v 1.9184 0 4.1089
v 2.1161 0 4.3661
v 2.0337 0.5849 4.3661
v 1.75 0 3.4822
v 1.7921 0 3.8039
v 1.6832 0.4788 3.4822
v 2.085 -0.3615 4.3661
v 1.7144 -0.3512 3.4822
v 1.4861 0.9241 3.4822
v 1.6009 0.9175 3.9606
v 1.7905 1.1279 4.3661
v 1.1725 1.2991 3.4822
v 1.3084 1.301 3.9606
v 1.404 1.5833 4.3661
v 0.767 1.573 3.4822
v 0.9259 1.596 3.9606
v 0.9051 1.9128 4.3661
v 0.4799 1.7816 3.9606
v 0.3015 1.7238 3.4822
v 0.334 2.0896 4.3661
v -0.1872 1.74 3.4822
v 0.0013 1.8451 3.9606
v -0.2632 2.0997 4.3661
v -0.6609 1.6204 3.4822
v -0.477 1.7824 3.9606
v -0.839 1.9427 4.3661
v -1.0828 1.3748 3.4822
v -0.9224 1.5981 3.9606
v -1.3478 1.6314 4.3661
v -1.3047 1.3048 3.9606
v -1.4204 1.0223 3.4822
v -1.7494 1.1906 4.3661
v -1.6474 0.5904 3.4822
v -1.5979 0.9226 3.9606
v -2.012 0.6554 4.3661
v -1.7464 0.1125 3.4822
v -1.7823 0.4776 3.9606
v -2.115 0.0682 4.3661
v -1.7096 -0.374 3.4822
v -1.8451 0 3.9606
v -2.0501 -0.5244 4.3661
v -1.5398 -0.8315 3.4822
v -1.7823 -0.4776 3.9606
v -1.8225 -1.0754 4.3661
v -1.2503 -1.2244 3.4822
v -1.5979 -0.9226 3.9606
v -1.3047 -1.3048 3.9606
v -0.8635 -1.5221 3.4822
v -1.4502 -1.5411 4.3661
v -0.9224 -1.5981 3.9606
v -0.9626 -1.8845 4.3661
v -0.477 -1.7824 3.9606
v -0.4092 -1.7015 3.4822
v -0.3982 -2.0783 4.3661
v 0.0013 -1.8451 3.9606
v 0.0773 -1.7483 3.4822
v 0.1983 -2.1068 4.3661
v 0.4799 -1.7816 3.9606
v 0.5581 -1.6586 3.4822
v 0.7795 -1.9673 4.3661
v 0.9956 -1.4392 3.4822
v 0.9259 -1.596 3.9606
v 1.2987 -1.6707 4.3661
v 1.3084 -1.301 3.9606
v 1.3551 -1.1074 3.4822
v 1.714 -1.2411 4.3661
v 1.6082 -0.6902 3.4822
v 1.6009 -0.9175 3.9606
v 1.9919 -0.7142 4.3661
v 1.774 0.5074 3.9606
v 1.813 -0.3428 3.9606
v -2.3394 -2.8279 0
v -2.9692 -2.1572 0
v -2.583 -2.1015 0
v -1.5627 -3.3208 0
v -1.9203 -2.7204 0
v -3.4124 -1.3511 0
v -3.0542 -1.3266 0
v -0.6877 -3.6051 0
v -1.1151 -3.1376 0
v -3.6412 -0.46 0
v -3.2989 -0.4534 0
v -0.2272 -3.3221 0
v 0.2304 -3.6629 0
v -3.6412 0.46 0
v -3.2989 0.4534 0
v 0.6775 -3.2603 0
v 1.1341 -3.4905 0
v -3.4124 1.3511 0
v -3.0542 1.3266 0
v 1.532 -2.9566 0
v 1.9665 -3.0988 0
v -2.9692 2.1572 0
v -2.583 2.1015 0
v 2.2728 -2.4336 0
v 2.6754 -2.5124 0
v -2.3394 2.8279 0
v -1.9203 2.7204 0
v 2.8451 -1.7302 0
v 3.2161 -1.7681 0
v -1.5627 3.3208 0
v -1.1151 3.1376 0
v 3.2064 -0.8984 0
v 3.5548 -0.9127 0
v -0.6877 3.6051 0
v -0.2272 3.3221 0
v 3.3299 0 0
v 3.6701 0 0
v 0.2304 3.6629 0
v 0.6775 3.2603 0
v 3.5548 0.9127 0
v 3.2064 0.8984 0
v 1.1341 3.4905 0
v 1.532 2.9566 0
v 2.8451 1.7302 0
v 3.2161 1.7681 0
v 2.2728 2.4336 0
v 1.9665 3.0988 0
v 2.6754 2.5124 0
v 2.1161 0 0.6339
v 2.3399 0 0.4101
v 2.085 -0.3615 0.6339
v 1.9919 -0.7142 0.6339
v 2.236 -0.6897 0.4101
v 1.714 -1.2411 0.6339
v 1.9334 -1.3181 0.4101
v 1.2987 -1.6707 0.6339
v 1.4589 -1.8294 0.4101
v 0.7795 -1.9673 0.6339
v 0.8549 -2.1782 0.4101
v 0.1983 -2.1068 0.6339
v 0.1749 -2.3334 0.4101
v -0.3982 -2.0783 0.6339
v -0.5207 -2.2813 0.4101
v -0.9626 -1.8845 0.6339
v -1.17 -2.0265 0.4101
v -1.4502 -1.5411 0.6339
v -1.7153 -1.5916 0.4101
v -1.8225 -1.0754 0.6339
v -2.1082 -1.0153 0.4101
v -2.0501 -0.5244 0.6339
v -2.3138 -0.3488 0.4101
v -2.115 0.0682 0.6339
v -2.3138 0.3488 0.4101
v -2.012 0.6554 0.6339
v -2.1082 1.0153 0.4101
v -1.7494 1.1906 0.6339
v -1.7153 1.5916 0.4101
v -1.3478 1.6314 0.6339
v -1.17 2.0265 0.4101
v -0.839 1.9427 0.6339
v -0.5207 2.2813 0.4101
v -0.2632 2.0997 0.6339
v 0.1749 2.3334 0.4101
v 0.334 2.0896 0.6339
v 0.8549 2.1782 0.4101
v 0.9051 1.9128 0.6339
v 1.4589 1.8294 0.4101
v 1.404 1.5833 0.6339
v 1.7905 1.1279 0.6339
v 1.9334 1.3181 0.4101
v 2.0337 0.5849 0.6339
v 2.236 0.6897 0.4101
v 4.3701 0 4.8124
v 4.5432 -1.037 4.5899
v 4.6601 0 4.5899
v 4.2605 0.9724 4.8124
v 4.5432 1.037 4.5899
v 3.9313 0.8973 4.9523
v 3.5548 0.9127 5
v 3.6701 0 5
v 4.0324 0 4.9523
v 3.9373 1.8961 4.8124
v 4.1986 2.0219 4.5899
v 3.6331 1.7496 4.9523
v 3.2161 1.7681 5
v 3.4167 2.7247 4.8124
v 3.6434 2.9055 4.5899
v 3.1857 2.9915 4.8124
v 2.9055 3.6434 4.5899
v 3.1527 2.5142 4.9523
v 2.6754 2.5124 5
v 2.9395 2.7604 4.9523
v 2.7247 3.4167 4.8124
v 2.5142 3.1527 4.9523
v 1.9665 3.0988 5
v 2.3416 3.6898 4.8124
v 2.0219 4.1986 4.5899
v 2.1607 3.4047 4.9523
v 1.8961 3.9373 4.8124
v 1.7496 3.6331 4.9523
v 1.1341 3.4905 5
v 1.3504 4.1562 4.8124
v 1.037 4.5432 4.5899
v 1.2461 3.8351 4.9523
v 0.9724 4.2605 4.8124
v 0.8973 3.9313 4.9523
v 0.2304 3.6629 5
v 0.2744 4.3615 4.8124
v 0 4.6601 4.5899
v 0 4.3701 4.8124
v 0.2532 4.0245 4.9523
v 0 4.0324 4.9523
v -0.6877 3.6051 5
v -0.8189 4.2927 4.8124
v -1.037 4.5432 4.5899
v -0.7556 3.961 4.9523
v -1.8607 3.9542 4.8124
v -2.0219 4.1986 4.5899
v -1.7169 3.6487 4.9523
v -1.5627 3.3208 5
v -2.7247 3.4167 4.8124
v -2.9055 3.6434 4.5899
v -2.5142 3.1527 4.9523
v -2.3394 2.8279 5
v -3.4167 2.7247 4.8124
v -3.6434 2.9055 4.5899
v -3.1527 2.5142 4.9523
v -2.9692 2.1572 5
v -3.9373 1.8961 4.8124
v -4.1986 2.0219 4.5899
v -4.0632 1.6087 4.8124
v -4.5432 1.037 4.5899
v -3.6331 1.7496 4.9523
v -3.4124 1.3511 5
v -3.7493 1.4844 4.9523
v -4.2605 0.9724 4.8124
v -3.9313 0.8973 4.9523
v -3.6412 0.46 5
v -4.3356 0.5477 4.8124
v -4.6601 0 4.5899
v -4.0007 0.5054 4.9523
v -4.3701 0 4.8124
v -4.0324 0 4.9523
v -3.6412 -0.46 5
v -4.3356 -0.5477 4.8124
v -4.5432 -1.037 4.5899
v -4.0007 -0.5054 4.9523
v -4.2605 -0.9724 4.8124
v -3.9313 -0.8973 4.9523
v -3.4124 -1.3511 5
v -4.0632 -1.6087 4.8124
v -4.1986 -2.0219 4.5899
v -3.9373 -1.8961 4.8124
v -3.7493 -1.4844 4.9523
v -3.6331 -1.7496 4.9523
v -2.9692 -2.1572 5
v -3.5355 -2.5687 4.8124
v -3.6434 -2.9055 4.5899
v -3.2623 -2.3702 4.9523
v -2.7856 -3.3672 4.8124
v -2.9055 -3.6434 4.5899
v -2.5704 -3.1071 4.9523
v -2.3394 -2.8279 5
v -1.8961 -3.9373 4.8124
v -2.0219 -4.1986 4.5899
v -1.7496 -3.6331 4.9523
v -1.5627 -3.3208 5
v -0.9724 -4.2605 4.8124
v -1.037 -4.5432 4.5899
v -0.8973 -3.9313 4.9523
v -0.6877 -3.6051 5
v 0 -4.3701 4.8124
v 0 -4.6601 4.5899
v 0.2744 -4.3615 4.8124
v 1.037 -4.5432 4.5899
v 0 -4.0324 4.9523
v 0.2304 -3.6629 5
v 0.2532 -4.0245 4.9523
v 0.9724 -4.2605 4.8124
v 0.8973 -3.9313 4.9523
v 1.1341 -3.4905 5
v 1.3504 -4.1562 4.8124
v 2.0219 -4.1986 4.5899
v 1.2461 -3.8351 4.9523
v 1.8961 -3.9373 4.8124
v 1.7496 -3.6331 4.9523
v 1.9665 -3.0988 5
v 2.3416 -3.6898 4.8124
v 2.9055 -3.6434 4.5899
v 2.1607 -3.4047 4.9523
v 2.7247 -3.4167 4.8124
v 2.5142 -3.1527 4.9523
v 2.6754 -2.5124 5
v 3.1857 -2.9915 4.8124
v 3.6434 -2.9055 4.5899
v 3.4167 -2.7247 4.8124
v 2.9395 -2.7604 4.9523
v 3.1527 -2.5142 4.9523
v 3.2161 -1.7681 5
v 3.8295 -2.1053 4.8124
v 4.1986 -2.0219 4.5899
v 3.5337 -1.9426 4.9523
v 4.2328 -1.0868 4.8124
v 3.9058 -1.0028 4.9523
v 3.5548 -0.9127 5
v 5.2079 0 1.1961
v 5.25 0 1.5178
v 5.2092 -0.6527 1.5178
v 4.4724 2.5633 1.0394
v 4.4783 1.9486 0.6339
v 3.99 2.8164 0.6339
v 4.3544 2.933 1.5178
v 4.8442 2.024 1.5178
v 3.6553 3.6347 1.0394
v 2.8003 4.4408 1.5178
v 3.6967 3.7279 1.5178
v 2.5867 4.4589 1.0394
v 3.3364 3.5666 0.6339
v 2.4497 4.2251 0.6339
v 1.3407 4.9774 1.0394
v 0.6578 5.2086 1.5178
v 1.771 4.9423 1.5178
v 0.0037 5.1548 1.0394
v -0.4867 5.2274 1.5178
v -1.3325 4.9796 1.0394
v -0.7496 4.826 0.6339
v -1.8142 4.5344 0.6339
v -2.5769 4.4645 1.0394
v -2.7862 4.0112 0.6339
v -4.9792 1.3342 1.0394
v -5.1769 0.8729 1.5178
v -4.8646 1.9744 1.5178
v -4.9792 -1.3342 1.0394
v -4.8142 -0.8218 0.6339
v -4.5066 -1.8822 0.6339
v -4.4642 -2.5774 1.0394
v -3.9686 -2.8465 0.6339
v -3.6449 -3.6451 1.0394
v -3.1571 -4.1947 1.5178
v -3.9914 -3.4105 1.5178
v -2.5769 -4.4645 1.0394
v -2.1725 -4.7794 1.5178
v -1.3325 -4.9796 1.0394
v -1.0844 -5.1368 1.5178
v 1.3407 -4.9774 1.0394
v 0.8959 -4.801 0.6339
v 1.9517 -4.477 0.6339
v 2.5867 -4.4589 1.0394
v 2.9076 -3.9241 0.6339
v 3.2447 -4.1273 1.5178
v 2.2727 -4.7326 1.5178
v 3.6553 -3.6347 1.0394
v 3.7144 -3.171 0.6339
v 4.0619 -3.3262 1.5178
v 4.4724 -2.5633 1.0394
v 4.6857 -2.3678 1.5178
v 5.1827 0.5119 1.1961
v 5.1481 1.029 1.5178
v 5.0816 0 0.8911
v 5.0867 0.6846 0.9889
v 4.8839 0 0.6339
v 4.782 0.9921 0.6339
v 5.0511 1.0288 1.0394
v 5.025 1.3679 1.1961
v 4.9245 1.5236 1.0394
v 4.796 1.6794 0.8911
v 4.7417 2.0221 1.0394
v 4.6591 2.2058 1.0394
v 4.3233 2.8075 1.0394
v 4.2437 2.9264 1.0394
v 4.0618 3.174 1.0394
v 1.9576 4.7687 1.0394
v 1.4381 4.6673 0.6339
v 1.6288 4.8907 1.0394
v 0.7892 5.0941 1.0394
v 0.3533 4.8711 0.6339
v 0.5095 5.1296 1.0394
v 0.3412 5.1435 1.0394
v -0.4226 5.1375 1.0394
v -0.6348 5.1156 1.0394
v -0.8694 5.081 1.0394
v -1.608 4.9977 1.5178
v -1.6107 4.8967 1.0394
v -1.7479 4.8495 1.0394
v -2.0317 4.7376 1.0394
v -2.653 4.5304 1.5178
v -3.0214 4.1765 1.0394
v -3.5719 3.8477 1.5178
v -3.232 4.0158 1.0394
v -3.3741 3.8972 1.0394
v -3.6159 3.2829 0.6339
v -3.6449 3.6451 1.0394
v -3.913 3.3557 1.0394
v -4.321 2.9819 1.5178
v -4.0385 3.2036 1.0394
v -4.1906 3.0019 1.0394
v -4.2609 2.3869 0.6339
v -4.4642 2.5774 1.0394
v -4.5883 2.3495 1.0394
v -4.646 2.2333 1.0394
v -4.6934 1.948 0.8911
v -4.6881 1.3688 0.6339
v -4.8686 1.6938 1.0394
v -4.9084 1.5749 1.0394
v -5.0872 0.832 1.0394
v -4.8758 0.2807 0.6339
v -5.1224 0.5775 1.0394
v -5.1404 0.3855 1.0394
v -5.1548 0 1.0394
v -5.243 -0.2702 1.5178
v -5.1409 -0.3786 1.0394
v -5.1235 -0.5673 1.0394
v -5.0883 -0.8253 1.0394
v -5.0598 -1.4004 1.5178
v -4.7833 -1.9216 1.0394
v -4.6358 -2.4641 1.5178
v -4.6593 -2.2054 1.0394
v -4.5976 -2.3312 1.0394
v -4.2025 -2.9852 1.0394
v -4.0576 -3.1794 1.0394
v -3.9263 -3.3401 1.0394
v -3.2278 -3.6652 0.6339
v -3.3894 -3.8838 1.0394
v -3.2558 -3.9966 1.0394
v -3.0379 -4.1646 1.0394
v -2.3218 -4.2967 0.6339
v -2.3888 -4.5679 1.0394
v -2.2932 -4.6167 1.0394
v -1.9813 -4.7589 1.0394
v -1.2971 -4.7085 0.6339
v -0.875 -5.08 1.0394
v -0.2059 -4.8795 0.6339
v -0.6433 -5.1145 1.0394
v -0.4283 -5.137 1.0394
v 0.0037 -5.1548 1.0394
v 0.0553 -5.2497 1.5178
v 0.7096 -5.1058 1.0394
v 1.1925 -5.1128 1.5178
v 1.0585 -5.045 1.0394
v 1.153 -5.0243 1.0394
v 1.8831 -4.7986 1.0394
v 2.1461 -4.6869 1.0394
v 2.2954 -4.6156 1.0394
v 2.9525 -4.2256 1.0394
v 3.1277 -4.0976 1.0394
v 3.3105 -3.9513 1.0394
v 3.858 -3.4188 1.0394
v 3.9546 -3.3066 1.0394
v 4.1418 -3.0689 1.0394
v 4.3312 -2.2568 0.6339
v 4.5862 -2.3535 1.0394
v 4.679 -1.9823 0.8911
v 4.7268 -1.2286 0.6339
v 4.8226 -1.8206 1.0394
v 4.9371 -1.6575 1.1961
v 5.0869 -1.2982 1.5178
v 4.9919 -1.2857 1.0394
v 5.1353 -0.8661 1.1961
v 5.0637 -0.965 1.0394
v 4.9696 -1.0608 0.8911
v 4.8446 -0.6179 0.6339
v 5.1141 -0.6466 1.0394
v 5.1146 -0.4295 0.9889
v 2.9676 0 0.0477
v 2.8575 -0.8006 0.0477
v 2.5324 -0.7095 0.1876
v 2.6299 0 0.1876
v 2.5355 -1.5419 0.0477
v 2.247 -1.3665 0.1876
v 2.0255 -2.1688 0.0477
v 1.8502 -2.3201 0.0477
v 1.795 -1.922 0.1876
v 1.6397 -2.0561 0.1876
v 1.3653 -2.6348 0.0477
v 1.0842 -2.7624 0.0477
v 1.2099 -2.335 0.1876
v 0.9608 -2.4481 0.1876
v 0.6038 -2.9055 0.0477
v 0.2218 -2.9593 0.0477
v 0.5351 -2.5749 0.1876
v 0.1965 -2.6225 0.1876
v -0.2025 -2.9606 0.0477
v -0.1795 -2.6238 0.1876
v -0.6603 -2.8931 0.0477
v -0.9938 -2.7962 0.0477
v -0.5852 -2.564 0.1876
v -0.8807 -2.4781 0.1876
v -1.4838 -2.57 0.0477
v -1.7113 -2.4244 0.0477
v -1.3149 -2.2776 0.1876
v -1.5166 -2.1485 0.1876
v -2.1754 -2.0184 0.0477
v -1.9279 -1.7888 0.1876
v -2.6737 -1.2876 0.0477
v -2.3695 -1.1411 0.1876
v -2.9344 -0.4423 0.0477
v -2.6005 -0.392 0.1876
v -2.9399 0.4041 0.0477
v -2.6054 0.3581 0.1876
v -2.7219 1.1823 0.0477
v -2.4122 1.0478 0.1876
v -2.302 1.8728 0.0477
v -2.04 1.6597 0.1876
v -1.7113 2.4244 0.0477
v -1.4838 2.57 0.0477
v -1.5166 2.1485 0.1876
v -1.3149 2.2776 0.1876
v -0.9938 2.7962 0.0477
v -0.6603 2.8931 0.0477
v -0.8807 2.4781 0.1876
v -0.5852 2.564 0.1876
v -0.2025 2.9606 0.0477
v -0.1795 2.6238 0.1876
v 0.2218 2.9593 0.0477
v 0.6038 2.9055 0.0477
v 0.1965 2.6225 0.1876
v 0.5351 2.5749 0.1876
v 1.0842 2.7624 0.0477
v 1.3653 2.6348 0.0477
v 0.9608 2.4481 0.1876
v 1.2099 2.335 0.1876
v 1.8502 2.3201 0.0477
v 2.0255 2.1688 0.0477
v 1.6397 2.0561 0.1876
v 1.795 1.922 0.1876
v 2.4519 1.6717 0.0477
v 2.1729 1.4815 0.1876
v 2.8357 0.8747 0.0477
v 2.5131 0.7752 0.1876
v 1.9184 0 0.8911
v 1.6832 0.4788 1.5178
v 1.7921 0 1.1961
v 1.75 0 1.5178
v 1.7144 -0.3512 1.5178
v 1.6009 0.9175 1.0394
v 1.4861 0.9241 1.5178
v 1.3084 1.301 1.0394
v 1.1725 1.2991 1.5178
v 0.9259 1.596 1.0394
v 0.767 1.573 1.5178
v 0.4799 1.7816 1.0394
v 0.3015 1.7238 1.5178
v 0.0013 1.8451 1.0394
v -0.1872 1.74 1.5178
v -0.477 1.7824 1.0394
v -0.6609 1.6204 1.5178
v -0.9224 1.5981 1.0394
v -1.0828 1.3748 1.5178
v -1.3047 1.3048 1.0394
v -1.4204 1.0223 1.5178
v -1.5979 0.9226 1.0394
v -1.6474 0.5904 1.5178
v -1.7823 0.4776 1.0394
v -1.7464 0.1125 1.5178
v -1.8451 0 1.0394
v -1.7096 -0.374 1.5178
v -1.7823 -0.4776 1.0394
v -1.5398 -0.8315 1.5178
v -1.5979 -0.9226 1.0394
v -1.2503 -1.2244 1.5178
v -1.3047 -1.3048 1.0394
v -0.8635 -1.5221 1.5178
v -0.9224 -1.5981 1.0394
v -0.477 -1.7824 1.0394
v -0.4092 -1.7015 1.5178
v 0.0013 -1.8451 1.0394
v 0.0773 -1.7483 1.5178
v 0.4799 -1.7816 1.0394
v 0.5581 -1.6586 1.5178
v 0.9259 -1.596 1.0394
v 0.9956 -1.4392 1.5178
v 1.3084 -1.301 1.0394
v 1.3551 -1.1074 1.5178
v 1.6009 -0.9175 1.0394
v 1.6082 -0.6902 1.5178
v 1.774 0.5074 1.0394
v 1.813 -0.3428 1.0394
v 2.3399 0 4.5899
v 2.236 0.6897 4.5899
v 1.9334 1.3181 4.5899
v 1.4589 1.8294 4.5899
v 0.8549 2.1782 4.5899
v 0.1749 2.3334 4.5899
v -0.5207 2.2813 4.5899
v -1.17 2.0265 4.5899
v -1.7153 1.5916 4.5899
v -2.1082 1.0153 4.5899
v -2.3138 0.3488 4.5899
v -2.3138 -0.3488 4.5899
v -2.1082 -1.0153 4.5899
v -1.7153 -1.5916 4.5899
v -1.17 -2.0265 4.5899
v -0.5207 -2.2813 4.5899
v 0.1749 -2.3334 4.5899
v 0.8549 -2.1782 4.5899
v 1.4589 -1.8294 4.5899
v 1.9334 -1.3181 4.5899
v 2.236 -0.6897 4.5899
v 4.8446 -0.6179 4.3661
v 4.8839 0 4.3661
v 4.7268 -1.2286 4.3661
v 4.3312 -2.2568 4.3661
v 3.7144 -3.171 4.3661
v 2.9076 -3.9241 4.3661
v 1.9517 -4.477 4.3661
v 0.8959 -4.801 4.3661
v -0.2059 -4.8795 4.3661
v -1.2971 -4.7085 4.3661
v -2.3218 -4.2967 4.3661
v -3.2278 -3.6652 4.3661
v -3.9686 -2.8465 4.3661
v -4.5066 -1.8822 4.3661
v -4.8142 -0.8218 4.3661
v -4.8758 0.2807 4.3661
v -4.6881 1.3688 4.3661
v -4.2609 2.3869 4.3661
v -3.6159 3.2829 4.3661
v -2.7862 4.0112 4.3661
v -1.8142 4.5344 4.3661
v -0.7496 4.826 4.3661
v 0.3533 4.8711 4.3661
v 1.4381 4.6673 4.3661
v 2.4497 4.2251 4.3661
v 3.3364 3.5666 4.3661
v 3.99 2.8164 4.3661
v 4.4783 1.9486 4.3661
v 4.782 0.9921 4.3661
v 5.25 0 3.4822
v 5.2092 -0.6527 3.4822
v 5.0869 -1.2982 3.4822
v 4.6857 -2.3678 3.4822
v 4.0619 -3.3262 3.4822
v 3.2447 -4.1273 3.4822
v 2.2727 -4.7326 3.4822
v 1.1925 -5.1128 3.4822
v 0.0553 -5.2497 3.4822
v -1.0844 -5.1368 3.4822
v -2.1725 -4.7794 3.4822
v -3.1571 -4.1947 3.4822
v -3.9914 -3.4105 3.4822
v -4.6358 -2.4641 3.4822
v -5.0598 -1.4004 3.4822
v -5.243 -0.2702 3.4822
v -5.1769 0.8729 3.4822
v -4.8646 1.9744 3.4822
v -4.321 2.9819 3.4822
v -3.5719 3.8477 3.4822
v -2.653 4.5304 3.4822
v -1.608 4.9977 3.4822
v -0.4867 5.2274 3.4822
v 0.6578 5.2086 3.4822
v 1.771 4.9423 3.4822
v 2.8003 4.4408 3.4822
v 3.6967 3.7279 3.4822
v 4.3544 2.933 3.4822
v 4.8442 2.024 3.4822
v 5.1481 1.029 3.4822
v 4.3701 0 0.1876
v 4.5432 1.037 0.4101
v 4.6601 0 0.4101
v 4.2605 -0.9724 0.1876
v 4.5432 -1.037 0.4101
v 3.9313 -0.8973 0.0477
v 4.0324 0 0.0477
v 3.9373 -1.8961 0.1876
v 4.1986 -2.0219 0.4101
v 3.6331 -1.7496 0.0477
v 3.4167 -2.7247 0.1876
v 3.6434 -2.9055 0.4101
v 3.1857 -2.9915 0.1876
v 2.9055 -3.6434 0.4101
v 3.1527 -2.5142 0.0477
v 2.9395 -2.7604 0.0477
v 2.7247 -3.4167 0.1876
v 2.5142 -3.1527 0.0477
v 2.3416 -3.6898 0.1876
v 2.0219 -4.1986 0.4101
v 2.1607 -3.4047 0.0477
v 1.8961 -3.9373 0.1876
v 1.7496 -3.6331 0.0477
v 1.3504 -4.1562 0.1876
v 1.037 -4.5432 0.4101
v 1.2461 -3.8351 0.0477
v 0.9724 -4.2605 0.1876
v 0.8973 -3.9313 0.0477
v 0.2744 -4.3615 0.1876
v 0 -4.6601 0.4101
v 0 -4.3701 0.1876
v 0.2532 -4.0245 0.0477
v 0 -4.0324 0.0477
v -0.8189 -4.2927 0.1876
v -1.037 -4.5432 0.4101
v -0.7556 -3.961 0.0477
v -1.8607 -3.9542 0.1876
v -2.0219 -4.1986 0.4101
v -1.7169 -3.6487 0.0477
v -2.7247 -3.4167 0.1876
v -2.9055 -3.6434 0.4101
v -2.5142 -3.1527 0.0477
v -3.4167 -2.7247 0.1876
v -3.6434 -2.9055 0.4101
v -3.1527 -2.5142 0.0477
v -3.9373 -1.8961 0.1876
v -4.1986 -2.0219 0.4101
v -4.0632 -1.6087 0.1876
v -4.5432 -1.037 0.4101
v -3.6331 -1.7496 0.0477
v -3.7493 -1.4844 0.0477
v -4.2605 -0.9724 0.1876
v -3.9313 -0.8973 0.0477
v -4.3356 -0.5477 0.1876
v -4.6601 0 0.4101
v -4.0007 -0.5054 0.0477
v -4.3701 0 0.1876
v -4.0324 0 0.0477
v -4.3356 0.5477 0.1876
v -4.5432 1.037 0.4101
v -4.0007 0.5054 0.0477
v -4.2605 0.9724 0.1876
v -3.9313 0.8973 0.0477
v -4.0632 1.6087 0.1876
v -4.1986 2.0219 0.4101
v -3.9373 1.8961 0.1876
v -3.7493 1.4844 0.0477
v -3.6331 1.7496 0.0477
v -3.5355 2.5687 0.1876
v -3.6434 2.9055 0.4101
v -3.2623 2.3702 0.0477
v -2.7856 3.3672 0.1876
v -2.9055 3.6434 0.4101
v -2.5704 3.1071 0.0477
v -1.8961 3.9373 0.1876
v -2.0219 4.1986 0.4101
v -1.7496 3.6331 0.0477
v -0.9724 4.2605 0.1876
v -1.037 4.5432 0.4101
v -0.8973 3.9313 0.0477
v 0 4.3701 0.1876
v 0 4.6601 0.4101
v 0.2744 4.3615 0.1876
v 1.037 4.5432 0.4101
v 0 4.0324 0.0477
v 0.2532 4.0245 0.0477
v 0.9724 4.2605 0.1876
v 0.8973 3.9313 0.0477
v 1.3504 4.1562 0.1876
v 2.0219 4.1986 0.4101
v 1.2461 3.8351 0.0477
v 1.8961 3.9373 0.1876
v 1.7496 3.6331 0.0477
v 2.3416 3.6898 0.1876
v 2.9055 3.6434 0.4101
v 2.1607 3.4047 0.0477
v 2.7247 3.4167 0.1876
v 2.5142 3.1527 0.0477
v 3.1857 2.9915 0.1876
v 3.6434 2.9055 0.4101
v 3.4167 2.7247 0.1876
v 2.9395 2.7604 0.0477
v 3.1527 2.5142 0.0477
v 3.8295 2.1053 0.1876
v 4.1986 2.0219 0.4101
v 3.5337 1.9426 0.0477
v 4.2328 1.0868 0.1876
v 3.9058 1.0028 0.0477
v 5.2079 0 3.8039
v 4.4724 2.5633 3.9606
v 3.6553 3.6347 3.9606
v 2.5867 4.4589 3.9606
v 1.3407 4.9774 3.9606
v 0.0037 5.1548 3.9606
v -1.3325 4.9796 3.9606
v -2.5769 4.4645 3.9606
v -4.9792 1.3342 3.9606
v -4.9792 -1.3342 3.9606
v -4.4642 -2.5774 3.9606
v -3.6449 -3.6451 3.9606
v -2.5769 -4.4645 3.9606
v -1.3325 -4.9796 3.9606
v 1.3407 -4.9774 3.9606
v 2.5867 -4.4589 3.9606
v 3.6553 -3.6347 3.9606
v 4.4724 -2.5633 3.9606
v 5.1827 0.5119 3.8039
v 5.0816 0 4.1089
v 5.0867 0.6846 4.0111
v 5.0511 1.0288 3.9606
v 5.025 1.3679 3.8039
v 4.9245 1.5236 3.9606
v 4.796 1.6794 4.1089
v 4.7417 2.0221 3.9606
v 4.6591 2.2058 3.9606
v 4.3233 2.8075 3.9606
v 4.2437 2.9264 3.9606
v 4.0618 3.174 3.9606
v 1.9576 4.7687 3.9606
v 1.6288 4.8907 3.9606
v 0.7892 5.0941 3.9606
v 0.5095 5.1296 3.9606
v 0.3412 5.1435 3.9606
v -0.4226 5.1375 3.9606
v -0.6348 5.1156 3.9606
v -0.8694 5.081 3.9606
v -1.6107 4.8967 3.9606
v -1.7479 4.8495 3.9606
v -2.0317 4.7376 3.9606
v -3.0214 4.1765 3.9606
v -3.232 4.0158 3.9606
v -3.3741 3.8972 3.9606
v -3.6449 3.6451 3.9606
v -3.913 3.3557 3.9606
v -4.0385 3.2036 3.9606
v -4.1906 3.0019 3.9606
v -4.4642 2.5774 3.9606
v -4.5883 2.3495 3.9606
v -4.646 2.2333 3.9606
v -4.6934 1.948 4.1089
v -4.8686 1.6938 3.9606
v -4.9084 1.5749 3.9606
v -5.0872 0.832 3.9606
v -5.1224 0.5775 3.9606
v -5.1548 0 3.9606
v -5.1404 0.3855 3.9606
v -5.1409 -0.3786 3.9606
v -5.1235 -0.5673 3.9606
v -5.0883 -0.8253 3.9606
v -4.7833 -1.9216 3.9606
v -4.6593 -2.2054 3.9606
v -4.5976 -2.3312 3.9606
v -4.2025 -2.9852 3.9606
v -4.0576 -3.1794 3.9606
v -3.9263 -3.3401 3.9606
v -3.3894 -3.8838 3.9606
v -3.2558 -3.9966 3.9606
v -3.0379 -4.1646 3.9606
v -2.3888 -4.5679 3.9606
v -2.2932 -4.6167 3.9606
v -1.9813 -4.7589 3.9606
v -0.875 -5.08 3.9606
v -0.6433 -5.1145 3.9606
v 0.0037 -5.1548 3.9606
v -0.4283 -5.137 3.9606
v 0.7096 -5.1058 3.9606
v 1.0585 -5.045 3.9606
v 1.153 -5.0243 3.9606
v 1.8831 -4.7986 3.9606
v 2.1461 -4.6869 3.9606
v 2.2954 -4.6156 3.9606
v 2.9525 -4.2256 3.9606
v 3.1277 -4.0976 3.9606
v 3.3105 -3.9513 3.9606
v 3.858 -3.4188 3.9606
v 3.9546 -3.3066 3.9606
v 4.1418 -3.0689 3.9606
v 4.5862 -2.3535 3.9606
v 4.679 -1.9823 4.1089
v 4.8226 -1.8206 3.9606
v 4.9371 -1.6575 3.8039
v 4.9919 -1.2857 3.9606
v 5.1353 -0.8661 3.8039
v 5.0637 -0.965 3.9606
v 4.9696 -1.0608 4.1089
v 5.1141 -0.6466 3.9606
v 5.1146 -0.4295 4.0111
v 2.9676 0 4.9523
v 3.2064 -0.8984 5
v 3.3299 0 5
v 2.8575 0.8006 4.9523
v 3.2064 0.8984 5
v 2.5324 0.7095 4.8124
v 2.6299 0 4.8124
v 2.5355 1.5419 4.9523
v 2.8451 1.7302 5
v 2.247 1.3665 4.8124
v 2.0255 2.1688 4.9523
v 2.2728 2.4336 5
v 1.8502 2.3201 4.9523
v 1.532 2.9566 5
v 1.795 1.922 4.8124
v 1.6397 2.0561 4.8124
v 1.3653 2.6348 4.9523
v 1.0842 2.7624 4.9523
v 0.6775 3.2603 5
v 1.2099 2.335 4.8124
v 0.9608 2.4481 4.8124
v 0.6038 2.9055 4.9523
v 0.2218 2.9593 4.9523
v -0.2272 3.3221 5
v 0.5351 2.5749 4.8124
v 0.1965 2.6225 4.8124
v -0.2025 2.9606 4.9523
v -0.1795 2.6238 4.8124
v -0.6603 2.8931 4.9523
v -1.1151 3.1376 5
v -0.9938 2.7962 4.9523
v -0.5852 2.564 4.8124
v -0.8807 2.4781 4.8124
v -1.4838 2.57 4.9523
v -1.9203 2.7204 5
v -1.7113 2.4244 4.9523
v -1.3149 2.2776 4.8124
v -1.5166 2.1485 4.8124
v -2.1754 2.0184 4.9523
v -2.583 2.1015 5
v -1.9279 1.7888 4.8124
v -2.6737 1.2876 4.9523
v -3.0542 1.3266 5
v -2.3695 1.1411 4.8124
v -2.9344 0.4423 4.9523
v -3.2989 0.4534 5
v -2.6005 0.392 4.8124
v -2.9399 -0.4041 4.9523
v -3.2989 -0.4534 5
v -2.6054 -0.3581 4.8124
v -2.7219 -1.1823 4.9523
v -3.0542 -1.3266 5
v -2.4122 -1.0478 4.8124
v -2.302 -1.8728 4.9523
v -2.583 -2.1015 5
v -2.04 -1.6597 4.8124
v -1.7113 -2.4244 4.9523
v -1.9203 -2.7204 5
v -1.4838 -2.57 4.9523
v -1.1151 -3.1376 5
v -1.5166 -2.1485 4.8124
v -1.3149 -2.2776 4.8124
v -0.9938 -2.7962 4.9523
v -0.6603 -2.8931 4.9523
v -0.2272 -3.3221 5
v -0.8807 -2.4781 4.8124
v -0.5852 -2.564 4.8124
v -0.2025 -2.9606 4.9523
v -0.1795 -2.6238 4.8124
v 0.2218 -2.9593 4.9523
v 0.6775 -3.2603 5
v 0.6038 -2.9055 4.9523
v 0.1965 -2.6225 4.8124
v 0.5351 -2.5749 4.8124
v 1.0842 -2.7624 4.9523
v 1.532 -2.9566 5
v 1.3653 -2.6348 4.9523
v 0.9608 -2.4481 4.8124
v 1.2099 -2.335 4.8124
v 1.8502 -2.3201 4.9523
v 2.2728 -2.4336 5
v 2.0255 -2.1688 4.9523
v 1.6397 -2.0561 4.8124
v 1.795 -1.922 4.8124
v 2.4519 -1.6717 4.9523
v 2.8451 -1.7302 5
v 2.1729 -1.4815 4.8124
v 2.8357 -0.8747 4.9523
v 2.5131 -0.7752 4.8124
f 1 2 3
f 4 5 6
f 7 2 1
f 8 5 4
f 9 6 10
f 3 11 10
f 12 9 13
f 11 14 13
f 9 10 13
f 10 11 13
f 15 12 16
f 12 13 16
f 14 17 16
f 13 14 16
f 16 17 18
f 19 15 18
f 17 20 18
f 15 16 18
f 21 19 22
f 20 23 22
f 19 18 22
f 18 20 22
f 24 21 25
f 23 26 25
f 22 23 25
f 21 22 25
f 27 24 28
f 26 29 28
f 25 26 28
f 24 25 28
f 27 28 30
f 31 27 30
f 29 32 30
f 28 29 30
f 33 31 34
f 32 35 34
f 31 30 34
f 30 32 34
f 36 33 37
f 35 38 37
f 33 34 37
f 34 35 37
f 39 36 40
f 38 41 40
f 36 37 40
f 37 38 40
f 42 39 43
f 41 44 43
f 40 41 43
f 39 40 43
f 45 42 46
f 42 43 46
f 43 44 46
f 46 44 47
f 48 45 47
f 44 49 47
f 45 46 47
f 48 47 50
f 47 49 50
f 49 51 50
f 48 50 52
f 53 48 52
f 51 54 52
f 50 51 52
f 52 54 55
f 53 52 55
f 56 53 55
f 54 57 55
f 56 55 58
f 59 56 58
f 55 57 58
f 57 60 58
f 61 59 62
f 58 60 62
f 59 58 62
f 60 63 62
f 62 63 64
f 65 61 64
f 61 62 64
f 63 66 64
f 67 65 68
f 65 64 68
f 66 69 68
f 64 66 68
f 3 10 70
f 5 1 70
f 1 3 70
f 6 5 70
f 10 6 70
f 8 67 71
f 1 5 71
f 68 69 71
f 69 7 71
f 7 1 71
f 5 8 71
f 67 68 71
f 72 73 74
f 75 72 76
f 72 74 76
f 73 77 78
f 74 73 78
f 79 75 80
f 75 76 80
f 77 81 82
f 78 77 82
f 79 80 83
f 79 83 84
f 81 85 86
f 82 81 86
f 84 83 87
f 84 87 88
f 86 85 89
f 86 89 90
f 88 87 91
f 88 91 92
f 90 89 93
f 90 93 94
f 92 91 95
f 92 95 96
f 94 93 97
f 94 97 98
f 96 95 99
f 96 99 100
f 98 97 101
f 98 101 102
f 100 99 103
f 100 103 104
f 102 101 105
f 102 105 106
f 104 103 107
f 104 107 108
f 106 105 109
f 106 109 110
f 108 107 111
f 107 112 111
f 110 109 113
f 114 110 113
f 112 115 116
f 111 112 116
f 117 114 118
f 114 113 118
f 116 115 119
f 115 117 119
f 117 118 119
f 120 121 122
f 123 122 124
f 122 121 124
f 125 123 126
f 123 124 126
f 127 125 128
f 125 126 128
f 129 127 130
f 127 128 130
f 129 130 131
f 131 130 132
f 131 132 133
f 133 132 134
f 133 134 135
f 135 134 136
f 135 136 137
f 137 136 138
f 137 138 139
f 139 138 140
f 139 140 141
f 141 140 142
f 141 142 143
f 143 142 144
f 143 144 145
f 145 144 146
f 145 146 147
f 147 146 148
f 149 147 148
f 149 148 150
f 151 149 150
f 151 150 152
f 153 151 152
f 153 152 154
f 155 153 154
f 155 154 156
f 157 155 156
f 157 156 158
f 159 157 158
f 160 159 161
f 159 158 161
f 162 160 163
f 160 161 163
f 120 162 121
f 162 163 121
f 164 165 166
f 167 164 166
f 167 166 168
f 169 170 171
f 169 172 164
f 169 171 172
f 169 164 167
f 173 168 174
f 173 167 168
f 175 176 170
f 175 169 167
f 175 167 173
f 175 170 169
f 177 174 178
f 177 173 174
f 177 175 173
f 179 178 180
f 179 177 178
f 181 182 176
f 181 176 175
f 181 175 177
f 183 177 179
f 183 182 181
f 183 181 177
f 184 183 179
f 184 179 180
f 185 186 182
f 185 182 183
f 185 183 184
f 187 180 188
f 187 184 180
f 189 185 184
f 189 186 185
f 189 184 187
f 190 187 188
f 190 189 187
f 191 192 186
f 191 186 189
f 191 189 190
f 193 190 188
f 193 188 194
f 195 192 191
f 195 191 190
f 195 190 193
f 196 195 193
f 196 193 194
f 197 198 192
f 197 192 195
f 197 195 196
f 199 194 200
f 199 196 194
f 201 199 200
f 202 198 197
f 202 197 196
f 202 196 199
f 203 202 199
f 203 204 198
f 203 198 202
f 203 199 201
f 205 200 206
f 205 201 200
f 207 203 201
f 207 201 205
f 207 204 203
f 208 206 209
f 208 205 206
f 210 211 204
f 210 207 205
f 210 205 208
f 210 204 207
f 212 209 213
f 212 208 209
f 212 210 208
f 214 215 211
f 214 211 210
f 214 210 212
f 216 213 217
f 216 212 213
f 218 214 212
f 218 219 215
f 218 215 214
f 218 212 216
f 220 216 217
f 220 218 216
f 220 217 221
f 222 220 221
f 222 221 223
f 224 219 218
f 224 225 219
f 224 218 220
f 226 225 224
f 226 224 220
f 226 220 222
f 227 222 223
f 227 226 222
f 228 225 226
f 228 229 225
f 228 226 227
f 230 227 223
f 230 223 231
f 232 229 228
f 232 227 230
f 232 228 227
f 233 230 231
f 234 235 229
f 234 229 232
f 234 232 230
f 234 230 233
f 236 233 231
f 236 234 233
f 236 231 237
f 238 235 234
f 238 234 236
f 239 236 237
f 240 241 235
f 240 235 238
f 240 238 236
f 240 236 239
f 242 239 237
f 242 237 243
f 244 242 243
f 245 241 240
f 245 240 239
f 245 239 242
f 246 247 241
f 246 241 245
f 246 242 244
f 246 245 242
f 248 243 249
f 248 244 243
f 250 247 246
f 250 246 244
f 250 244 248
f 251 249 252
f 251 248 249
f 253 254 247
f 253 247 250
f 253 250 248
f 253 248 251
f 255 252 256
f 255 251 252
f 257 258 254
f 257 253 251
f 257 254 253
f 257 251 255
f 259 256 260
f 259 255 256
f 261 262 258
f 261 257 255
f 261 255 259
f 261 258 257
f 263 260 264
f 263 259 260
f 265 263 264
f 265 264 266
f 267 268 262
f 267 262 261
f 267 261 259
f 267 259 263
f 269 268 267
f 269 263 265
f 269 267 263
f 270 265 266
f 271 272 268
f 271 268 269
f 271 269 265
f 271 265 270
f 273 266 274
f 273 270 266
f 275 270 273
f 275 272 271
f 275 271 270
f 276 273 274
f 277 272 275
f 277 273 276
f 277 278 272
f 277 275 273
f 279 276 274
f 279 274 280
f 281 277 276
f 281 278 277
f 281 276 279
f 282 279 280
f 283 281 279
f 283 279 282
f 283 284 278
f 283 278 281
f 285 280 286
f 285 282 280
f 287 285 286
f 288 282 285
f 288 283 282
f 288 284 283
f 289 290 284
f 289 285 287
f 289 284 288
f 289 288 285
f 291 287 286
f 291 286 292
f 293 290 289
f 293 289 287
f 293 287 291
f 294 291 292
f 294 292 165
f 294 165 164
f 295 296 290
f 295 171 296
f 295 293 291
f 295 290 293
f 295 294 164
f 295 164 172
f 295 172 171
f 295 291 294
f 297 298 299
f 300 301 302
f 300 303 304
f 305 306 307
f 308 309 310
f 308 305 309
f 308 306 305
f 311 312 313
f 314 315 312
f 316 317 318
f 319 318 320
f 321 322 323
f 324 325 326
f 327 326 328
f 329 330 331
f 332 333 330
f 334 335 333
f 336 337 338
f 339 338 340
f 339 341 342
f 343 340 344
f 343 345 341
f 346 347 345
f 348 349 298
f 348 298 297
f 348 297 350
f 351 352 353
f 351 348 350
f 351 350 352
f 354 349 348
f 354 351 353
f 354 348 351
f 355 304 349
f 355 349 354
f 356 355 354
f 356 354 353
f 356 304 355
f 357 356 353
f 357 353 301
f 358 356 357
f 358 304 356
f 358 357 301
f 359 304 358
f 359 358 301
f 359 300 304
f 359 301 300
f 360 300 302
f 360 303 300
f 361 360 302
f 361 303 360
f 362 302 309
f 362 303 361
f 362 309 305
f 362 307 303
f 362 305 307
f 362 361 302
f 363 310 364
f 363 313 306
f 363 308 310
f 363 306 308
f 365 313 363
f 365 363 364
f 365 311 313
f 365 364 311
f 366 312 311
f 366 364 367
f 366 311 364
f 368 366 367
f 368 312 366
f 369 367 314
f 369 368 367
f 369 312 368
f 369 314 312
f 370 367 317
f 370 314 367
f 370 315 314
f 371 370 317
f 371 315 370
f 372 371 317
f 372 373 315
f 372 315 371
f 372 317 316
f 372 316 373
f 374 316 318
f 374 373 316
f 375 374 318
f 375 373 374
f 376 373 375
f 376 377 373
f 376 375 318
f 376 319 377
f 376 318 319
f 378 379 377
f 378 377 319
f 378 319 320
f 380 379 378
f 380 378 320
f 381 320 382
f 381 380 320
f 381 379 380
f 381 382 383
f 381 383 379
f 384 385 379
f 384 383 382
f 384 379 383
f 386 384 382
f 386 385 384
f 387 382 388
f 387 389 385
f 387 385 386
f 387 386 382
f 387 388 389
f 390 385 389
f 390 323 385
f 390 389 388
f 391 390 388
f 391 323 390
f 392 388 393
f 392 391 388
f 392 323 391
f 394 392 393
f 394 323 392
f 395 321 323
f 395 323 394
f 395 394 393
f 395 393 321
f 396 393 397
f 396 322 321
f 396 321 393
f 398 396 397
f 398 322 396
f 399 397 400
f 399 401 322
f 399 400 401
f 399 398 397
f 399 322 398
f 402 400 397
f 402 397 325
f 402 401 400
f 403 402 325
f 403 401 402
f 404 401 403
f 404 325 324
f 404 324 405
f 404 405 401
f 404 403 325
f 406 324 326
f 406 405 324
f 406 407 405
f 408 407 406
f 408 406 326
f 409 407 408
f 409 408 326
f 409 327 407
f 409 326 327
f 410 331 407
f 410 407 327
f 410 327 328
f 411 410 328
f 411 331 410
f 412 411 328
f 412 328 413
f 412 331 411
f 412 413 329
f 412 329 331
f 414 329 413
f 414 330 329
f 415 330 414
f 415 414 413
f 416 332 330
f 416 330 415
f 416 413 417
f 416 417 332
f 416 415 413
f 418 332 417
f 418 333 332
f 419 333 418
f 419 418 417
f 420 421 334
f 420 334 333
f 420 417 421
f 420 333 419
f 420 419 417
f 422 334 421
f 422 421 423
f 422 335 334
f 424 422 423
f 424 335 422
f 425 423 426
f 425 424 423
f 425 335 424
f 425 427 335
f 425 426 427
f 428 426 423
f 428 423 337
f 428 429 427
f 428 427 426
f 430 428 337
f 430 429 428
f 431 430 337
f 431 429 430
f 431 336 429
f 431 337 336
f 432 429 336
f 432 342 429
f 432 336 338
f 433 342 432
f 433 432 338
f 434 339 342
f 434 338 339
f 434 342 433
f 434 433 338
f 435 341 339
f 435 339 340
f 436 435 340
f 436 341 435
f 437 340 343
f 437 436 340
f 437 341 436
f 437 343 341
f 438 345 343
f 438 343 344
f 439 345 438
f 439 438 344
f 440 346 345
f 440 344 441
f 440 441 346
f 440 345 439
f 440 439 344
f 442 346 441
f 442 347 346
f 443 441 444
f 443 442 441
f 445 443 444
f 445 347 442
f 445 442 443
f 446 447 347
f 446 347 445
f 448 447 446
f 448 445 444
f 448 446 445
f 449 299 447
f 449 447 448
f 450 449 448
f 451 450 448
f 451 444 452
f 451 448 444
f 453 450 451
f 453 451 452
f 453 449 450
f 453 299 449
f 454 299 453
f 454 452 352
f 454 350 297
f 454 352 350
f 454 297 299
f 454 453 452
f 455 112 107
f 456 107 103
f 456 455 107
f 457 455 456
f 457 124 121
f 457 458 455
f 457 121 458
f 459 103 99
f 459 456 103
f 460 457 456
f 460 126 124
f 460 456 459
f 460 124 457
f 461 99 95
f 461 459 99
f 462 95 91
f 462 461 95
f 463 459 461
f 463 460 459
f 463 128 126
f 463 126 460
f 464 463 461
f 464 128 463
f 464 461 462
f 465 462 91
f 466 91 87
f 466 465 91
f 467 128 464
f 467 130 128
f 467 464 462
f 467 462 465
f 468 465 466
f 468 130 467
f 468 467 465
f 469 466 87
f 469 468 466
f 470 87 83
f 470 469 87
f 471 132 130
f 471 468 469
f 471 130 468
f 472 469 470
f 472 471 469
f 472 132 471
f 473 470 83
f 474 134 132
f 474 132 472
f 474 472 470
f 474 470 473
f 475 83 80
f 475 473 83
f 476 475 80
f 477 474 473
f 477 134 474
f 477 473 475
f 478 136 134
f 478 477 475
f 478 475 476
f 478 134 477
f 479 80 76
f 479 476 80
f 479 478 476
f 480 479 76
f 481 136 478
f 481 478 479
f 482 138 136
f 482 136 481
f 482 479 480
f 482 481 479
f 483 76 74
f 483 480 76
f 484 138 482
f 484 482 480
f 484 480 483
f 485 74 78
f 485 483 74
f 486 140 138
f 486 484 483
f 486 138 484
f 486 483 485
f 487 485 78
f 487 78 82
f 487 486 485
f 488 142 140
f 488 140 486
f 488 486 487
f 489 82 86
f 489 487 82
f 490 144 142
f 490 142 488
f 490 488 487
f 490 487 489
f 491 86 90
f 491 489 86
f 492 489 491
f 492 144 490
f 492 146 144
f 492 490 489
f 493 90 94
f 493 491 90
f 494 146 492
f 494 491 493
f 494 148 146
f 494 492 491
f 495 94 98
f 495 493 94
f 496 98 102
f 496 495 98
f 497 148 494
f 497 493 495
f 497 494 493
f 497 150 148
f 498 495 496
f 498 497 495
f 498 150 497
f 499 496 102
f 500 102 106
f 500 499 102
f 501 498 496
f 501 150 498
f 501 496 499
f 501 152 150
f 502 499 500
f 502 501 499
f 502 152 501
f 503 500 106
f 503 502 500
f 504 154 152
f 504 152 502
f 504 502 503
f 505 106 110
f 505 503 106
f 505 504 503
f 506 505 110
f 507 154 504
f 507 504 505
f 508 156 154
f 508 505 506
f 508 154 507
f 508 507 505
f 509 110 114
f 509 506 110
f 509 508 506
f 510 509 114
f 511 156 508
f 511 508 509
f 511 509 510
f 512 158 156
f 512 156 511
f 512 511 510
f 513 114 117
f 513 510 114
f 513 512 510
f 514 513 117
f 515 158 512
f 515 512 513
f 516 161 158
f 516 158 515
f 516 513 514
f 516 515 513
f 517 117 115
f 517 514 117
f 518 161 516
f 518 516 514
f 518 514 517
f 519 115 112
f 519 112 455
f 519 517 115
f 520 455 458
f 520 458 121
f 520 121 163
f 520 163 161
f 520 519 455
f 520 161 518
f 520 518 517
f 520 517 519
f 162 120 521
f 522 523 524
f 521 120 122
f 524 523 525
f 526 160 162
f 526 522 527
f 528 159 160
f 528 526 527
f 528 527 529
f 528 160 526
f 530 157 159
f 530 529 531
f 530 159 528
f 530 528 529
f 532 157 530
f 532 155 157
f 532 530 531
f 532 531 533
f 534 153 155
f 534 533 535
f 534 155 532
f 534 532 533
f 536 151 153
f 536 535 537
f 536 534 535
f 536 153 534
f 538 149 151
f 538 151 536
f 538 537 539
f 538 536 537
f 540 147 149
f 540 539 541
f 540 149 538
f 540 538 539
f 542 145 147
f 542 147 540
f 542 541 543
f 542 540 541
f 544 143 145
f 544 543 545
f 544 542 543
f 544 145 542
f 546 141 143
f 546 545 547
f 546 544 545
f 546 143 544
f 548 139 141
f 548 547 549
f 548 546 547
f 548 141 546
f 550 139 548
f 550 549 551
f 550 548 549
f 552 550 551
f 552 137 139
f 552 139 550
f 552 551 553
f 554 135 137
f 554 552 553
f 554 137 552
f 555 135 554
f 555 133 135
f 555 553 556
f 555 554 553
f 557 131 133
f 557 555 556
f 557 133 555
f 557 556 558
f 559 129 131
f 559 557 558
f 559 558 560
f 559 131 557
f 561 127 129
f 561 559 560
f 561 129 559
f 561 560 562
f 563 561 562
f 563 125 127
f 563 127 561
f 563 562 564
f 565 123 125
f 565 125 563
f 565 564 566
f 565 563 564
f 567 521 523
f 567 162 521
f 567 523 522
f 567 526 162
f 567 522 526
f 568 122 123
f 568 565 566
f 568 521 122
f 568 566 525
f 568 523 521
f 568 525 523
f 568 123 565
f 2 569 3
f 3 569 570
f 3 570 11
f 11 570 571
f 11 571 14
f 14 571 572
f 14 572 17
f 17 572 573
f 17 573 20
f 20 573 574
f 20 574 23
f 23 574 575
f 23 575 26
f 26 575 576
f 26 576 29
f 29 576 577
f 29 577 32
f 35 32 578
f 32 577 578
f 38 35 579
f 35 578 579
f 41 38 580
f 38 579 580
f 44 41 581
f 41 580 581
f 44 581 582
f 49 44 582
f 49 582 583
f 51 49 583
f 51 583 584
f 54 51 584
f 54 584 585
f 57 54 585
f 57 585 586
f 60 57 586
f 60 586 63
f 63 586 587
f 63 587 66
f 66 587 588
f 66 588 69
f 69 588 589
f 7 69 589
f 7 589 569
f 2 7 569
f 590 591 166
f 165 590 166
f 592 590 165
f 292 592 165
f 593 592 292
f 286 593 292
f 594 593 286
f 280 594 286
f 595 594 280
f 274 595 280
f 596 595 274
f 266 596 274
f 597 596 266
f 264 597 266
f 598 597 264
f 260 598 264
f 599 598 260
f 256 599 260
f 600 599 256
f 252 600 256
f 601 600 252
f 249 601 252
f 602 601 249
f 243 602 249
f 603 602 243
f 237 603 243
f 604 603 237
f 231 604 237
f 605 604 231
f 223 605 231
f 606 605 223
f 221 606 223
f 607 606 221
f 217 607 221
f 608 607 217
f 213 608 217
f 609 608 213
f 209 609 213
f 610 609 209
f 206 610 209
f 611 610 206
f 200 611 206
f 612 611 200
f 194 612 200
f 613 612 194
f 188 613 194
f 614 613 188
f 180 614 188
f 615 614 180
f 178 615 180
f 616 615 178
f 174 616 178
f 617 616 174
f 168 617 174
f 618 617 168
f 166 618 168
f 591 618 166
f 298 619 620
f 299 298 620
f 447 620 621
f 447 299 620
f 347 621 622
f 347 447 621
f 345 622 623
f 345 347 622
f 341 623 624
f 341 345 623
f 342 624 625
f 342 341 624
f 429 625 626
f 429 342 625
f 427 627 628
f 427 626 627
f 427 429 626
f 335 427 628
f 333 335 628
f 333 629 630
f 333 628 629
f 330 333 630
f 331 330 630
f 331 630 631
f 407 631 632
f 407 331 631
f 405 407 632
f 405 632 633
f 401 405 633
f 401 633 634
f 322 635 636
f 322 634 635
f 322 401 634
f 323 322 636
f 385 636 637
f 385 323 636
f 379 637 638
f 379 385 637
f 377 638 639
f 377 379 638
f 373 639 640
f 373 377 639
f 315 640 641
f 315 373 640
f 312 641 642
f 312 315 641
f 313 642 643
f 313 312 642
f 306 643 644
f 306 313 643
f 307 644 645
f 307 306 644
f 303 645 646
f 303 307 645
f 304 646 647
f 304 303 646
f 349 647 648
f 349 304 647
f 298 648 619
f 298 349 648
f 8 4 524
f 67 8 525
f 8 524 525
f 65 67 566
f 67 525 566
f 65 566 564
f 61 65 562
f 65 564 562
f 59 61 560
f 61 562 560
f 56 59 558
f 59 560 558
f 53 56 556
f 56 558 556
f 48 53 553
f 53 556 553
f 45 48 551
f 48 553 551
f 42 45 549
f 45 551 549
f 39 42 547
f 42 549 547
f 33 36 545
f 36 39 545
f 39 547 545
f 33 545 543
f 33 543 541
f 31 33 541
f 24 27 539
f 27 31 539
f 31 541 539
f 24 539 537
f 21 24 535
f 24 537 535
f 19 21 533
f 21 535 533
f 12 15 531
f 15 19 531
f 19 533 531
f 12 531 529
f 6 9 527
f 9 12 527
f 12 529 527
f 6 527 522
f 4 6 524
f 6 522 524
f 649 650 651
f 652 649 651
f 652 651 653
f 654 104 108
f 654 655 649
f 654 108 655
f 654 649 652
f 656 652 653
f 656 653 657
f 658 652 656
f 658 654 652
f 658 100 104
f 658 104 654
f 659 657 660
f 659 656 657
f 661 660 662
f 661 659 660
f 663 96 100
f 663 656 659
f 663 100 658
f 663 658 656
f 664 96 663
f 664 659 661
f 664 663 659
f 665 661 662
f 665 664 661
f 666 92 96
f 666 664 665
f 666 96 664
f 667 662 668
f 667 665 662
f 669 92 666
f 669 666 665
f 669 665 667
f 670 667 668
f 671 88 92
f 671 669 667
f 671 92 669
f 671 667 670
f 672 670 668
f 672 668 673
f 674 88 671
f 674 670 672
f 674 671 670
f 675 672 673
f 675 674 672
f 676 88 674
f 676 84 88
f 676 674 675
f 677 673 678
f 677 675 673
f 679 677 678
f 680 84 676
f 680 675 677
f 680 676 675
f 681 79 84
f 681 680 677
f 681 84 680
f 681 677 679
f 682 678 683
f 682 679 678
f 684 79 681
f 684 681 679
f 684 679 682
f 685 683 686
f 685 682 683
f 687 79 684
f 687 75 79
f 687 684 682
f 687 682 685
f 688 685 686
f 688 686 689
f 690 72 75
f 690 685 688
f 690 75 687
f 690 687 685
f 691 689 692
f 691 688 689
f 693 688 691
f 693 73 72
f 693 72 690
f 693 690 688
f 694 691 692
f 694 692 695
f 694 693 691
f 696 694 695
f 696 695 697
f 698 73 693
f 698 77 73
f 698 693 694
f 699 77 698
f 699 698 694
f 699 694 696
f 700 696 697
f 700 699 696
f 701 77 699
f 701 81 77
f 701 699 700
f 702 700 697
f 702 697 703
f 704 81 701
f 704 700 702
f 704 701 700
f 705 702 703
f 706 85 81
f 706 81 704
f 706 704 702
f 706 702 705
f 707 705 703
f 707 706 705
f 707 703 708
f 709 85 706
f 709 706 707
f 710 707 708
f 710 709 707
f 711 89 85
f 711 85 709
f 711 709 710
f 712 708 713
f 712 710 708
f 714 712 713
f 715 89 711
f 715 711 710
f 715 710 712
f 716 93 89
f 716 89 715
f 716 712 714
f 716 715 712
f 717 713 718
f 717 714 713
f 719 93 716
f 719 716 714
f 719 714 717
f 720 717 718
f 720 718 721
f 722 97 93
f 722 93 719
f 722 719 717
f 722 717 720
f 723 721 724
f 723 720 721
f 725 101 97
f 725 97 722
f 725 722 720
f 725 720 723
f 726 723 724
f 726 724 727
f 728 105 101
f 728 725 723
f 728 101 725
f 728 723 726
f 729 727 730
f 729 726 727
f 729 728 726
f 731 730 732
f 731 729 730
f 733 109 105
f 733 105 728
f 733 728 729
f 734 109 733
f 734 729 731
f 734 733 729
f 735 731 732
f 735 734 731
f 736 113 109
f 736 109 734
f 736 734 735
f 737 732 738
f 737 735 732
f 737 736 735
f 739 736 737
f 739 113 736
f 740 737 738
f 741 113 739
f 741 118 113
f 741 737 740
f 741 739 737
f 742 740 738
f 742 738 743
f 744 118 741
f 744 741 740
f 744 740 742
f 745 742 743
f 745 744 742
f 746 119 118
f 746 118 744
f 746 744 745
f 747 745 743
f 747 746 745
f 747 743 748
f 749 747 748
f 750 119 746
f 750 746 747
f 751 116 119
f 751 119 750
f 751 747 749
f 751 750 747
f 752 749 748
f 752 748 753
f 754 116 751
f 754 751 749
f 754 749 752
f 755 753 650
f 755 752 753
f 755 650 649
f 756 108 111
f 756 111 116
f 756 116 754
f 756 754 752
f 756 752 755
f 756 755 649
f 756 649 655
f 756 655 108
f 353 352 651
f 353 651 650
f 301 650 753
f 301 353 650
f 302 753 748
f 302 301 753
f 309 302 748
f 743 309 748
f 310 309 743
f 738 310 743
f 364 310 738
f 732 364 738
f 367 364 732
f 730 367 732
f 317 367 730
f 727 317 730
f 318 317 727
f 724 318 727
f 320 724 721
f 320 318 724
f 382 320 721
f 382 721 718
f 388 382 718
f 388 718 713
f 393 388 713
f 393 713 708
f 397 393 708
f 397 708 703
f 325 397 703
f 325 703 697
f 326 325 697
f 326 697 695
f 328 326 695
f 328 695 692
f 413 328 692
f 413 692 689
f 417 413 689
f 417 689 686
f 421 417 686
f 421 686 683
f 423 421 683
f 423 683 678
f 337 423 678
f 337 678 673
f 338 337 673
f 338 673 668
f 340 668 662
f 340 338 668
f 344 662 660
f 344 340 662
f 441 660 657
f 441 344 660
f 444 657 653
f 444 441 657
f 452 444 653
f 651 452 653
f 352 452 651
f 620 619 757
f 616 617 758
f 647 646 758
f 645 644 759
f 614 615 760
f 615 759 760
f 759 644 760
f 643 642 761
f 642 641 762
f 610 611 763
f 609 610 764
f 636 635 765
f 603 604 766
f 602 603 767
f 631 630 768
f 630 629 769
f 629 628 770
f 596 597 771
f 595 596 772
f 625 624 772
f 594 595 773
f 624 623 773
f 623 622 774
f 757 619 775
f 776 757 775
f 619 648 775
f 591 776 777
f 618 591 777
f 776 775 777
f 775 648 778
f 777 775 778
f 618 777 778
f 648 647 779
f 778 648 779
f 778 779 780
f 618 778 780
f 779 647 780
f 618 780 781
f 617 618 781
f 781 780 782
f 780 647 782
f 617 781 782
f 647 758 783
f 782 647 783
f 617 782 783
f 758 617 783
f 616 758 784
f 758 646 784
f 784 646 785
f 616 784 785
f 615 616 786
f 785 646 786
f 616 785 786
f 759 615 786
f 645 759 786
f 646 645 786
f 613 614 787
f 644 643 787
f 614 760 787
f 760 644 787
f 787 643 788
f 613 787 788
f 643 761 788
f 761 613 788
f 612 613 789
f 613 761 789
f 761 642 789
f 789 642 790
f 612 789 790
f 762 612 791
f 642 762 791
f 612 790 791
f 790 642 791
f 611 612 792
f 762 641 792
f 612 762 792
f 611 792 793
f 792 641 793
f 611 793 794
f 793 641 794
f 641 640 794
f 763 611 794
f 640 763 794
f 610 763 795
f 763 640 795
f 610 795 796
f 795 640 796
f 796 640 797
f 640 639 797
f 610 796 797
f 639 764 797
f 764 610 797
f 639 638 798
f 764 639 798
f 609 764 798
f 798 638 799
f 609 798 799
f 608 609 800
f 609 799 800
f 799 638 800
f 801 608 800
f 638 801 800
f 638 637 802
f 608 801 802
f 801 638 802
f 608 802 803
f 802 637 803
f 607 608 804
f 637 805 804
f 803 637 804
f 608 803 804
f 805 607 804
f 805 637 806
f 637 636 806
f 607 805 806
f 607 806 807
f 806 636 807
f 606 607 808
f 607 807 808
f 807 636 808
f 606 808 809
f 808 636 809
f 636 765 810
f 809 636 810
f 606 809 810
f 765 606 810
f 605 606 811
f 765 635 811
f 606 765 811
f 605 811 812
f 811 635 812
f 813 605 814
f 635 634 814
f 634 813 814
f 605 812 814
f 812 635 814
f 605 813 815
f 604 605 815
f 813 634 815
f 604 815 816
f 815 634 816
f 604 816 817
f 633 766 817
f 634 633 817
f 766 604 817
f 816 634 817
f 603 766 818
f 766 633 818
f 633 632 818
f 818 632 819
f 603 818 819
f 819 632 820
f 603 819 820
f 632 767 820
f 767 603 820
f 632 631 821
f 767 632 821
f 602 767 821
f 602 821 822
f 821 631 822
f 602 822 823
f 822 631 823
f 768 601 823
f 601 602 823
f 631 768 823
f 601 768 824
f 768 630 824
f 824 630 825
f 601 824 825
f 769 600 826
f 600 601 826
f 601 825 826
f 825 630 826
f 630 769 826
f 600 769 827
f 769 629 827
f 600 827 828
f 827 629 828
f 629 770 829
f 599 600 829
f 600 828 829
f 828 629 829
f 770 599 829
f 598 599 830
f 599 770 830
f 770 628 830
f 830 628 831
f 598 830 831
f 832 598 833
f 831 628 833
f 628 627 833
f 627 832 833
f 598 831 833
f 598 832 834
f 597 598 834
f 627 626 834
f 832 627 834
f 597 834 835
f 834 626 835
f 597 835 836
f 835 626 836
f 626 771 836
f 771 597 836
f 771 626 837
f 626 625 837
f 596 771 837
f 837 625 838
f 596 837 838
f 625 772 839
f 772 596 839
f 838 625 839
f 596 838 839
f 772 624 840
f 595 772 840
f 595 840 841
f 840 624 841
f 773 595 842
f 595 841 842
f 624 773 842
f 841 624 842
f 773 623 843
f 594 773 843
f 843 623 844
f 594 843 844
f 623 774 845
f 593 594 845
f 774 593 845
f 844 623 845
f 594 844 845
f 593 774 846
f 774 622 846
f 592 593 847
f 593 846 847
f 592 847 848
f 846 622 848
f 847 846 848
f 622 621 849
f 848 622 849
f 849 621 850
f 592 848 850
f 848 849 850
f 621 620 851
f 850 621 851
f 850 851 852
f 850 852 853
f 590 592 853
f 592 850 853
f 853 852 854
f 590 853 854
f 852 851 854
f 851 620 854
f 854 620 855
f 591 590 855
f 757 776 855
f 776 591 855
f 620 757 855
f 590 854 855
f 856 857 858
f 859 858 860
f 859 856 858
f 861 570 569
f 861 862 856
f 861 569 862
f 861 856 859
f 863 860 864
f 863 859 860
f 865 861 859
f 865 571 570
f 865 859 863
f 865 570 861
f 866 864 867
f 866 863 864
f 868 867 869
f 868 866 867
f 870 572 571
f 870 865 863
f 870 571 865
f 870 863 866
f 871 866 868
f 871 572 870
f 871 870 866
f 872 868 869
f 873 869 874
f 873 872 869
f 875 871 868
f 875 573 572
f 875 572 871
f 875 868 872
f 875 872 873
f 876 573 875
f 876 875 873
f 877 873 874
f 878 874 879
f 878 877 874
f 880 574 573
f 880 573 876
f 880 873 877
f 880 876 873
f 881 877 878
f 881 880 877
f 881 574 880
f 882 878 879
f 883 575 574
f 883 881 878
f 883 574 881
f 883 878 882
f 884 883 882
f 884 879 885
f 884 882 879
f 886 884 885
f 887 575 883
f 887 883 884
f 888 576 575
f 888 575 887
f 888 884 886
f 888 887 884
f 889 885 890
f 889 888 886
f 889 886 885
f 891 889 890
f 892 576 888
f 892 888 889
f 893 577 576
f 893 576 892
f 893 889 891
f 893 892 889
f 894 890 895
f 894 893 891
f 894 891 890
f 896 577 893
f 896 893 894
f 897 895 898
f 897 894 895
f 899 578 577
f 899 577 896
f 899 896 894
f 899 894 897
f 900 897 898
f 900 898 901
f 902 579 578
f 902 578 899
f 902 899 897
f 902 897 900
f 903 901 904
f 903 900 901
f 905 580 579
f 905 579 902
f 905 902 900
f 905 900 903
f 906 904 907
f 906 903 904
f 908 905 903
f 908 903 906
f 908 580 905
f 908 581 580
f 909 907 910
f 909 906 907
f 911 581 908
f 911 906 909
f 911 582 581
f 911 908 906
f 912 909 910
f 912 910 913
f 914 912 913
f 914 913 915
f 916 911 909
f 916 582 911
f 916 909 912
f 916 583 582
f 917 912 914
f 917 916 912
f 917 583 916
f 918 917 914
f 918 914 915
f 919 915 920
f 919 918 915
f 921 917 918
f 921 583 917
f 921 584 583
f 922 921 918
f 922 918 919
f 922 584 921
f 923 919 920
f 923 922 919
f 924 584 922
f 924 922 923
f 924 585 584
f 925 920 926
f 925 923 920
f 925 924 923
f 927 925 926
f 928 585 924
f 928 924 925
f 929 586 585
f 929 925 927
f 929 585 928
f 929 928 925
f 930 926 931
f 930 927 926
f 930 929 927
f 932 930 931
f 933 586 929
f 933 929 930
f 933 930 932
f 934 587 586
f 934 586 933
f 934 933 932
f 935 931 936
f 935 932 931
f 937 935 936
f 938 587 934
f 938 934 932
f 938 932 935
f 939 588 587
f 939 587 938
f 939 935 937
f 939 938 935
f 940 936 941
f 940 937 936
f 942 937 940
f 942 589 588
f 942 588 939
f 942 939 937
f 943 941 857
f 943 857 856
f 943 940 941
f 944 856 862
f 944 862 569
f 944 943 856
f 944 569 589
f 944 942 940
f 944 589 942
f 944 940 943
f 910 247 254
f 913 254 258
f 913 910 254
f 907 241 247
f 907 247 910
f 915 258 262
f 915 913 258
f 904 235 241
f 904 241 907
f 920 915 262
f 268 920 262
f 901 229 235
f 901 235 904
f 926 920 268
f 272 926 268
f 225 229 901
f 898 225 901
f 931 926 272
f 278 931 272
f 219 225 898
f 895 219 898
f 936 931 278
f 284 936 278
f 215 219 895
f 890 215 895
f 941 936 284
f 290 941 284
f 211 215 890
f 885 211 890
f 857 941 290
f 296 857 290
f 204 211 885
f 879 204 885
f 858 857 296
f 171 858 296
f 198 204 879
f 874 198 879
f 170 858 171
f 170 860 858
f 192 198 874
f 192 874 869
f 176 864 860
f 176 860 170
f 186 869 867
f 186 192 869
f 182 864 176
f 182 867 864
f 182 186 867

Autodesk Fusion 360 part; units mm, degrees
sketch "Sketch1" plane through (0, 0, 0) normal (0, 0, 1) x (1, 0, 0)
  circle A0 centre (0, 0) radius 1.75
  circle A1 centre (0, 0) radius 5.25
  dimension "d1" = 3.5
  dimension "d2" = 3.5
extrude "Extrude1" add sketch "Sketch1" along normal blind 5
chamfer "Chamfer1" distance 1 angle 45 4 edges at (-1.6316, 0.6328, 5) (-4.8947, -1.8985, 5) (-4.8947, -1.8985, 0) (-1.6316, 0.6328, 0)
fillet "Fillet1" radius 1.25 4 edges at (-4.8947, -1.8985, 4) (-4.8947, 1.8985, 1) (-1.6316, 0.6328, 4) (-1.6316, -0.6328, 1)
fillet "Fillet2" radius 1.4 4 edges at (-3.9624, -1.5369, 0) (-2.5639, 0.9944, 0) (-2.5639, -0.9944, 5) (-3.9624, 1.5369, 5)
